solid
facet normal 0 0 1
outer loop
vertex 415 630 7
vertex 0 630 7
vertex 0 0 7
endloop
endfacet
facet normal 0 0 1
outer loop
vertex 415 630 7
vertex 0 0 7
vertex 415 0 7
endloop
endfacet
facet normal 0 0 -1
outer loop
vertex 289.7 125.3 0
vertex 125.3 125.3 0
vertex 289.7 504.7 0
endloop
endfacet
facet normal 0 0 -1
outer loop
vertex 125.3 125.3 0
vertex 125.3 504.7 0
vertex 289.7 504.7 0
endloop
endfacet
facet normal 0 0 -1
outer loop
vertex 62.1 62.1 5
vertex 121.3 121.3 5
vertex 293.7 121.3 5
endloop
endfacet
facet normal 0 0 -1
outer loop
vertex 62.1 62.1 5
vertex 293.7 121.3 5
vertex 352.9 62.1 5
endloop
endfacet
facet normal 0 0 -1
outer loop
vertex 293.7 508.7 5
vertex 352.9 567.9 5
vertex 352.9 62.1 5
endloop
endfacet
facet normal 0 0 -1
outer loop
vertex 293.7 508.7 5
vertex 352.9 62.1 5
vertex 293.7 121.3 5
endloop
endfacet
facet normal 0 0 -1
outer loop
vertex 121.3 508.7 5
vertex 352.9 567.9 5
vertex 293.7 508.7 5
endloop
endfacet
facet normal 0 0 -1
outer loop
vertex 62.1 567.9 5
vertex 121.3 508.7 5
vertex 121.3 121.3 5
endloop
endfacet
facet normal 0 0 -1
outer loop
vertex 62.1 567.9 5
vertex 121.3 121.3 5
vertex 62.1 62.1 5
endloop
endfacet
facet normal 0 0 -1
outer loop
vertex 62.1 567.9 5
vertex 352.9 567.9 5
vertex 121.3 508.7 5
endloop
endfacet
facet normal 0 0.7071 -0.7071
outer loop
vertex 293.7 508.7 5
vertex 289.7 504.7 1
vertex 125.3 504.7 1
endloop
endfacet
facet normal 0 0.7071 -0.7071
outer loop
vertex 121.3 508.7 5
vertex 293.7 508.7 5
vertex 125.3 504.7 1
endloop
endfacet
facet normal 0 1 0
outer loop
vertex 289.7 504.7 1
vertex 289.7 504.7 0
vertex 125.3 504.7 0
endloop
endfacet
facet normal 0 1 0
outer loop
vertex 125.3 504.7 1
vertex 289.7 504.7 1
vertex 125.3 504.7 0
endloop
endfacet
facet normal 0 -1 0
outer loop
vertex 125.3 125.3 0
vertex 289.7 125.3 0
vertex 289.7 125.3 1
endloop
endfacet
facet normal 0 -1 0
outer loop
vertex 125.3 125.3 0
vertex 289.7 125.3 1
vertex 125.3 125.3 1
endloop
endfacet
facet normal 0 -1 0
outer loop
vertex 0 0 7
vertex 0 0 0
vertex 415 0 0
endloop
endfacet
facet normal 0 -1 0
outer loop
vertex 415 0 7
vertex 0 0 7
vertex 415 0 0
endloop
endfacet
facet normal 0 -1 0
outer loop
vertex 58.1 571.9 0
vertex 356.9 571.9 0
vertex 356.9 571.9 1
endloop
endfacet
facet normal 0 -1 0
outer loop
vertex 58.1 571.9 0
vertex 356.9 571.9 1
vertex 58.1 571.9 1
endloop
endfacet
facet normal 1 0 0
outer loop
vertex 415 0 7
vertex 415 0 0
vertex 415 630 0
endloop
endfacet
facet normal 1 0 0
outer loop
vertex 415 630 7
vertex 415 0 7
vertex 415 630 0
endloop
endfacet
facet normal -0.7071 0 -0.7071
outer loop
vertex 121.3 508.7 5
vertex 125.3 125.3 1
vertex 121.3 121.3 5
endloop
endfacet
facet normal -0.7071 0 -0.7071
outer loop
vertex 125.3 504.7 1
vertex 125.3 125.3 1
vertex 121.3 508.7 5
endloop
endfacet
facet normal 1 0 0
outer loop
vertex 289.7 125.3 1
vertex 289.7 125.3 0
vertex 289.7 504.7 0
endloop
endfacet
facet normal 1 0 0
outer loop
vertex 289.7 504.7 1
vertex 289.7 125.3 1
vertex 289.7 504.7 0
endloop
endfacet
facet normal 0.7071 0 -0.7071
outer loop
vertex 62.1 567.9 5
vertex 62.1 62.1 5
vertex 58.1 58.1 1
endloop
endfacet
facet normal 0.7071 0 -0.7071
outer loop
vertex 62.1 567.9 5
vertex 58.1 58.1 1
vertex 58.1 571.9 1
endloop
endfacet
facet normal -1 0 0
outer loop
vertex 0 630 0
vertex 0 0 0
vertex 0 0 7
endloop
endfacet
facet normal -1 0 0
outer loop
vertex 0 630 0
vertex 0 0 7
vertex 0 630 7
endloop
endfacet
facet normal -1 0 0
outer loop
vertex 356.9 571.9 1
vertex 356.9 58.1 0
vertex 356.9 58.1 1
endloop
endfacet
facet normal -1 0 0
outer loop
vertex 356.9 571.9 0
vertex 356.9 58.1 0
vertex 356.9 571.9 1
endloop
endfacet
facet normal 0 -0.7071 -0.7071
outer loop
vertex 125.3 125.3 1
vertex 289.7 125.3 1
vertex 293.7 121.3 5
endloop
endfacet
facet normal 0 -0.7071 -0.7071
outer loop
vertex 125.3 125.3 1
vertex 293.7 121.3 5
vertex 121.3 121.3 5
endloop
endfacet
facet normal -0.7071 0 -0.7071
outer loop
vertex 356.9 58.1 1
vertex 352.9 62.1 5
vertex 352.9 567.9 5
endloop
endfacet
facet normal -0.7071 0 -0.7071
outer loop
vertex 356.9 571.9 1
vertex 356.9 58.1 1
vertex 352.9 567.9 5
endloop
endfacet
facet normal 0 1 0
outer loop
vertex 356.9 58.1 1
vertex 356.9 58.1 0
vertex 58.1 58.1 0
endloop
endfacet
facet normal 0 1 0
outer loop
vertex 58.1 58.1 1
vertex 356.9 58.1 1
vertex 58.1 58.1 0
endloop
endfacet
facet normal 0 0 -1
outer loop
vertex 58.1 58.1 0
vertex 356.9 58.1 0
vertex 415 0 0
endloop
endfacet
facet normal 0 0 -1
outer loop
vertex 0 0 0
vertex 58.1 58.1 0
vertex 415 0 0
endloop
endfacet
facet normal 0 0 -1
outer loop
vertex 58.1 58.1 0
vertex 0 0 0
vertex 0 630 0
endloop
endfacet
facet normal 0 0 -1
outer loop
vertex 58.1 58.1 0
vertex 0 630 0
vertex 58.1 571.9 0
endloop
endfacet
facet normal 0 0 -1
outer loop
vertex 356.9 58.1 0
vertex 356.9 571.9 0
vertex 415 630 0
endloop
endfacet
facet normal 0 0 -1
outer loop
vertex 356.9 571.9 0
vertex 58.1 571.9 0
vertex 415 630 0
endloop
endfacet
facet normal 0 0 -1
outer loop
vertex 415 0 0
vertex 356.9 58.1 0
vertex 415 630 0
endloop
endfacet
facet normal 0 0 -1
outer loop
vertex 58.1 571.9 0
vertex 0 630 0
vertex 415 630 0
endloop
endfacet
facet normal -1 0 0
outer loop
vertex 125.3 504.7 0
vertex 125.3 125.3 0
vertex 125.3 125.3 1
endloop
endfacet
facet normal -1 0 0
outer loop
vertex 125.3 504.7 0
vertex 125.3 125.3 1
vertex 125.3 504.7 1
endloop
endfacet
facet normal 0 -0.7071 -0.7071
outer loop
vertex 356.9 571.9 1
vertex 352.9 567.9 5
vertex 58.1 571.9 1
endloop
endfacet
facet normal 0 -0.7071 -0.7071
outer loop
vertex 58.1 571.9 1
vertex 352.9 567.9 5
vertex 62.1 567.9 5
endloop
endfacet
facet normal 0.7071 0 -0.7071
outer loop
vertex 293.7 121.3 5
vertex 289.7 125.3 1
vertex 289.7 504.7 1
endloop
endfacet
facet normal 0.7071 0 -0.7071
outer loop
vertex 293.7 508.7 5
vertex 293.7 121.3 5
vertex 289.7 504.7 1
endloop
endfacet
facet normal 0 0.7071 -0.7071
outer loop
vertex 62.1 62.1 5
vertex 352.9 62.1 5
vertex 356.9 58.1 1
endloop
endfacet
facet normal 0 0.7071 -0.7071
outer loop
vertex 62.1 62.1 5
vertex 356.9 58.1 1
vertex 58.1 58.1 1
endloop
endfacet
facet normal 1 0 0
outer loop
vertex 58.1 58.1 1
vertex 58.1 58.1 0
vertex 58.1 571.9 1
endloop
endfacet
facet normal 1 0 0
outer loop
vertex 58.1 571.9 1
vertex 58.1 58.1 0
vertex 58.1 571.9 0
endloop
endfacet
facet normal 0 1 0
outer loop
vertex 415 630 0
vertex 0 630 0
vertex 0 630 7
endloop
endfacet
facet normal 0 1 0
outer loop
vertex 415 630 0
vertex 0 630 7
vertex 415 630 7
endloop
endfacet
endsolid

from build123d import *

# Parameters (mm, degrees)
SKETCH1_W          = 415
SKETCH1_H          = 630
BASE_EXTRUDE_DEPTH = 7
SKETCH19_W         = 298.8
SKETCH19_H         = 513.8
SKETCH19_W_2       = 164.4
SKETCH19_H_2       = 379.4
CUT_EXTRUDE1_DEPTH = 5
CHAMFER1_SIZE      = 4


with BuildPart() as part:
    # Sketch1 → Base-Extrude (new body)
    with BuildSketch(Plane.XY):
        with Locations((207.5, 315)):
            Rectangle(SKETCH1_W, SKETCH1_H)
    extrude(amount=BASE_EXTRUDE_DEPTH)

    # Sketch19 → Cut-Extrude1 (cut)
    with BuildSketch(Plane(origin=(0, 0, 0), x_dir=(-1, 0, 0), z_dir=(0, 0, -1))):
        with Locations((-207.5, 315)):
            Rectangle(SKETCH19_W, SKETCH19_H)
        with Locations((-207.5, 315)):
            Rectangle(SKETCH19_W_2, SKETCH19_H_2, mode=Mode.SUBTRACT)
    extrude(amount=-CUT_EXTRUDE1_DEPTH, mode=Mode.SUBTRACT)

    # Chamfer1
    chamfer1_edges = [part.edges().sort_by_distance(p)[0] for p in [
        (207.5, 58.1, 5),
        (356.9, 315, 5),
        (207.5, 571.9, 5),
        (58.1, 315, 5),
        (289.7, 315, 5),
        (207.5, 125.3, 5),
        (125.3, 315, 5),
        (207.5, 504.7, 5),
    ]]
    chamfer(chamfer1_edges, length=CHAMFER1_SIZE)


solid = part.part
